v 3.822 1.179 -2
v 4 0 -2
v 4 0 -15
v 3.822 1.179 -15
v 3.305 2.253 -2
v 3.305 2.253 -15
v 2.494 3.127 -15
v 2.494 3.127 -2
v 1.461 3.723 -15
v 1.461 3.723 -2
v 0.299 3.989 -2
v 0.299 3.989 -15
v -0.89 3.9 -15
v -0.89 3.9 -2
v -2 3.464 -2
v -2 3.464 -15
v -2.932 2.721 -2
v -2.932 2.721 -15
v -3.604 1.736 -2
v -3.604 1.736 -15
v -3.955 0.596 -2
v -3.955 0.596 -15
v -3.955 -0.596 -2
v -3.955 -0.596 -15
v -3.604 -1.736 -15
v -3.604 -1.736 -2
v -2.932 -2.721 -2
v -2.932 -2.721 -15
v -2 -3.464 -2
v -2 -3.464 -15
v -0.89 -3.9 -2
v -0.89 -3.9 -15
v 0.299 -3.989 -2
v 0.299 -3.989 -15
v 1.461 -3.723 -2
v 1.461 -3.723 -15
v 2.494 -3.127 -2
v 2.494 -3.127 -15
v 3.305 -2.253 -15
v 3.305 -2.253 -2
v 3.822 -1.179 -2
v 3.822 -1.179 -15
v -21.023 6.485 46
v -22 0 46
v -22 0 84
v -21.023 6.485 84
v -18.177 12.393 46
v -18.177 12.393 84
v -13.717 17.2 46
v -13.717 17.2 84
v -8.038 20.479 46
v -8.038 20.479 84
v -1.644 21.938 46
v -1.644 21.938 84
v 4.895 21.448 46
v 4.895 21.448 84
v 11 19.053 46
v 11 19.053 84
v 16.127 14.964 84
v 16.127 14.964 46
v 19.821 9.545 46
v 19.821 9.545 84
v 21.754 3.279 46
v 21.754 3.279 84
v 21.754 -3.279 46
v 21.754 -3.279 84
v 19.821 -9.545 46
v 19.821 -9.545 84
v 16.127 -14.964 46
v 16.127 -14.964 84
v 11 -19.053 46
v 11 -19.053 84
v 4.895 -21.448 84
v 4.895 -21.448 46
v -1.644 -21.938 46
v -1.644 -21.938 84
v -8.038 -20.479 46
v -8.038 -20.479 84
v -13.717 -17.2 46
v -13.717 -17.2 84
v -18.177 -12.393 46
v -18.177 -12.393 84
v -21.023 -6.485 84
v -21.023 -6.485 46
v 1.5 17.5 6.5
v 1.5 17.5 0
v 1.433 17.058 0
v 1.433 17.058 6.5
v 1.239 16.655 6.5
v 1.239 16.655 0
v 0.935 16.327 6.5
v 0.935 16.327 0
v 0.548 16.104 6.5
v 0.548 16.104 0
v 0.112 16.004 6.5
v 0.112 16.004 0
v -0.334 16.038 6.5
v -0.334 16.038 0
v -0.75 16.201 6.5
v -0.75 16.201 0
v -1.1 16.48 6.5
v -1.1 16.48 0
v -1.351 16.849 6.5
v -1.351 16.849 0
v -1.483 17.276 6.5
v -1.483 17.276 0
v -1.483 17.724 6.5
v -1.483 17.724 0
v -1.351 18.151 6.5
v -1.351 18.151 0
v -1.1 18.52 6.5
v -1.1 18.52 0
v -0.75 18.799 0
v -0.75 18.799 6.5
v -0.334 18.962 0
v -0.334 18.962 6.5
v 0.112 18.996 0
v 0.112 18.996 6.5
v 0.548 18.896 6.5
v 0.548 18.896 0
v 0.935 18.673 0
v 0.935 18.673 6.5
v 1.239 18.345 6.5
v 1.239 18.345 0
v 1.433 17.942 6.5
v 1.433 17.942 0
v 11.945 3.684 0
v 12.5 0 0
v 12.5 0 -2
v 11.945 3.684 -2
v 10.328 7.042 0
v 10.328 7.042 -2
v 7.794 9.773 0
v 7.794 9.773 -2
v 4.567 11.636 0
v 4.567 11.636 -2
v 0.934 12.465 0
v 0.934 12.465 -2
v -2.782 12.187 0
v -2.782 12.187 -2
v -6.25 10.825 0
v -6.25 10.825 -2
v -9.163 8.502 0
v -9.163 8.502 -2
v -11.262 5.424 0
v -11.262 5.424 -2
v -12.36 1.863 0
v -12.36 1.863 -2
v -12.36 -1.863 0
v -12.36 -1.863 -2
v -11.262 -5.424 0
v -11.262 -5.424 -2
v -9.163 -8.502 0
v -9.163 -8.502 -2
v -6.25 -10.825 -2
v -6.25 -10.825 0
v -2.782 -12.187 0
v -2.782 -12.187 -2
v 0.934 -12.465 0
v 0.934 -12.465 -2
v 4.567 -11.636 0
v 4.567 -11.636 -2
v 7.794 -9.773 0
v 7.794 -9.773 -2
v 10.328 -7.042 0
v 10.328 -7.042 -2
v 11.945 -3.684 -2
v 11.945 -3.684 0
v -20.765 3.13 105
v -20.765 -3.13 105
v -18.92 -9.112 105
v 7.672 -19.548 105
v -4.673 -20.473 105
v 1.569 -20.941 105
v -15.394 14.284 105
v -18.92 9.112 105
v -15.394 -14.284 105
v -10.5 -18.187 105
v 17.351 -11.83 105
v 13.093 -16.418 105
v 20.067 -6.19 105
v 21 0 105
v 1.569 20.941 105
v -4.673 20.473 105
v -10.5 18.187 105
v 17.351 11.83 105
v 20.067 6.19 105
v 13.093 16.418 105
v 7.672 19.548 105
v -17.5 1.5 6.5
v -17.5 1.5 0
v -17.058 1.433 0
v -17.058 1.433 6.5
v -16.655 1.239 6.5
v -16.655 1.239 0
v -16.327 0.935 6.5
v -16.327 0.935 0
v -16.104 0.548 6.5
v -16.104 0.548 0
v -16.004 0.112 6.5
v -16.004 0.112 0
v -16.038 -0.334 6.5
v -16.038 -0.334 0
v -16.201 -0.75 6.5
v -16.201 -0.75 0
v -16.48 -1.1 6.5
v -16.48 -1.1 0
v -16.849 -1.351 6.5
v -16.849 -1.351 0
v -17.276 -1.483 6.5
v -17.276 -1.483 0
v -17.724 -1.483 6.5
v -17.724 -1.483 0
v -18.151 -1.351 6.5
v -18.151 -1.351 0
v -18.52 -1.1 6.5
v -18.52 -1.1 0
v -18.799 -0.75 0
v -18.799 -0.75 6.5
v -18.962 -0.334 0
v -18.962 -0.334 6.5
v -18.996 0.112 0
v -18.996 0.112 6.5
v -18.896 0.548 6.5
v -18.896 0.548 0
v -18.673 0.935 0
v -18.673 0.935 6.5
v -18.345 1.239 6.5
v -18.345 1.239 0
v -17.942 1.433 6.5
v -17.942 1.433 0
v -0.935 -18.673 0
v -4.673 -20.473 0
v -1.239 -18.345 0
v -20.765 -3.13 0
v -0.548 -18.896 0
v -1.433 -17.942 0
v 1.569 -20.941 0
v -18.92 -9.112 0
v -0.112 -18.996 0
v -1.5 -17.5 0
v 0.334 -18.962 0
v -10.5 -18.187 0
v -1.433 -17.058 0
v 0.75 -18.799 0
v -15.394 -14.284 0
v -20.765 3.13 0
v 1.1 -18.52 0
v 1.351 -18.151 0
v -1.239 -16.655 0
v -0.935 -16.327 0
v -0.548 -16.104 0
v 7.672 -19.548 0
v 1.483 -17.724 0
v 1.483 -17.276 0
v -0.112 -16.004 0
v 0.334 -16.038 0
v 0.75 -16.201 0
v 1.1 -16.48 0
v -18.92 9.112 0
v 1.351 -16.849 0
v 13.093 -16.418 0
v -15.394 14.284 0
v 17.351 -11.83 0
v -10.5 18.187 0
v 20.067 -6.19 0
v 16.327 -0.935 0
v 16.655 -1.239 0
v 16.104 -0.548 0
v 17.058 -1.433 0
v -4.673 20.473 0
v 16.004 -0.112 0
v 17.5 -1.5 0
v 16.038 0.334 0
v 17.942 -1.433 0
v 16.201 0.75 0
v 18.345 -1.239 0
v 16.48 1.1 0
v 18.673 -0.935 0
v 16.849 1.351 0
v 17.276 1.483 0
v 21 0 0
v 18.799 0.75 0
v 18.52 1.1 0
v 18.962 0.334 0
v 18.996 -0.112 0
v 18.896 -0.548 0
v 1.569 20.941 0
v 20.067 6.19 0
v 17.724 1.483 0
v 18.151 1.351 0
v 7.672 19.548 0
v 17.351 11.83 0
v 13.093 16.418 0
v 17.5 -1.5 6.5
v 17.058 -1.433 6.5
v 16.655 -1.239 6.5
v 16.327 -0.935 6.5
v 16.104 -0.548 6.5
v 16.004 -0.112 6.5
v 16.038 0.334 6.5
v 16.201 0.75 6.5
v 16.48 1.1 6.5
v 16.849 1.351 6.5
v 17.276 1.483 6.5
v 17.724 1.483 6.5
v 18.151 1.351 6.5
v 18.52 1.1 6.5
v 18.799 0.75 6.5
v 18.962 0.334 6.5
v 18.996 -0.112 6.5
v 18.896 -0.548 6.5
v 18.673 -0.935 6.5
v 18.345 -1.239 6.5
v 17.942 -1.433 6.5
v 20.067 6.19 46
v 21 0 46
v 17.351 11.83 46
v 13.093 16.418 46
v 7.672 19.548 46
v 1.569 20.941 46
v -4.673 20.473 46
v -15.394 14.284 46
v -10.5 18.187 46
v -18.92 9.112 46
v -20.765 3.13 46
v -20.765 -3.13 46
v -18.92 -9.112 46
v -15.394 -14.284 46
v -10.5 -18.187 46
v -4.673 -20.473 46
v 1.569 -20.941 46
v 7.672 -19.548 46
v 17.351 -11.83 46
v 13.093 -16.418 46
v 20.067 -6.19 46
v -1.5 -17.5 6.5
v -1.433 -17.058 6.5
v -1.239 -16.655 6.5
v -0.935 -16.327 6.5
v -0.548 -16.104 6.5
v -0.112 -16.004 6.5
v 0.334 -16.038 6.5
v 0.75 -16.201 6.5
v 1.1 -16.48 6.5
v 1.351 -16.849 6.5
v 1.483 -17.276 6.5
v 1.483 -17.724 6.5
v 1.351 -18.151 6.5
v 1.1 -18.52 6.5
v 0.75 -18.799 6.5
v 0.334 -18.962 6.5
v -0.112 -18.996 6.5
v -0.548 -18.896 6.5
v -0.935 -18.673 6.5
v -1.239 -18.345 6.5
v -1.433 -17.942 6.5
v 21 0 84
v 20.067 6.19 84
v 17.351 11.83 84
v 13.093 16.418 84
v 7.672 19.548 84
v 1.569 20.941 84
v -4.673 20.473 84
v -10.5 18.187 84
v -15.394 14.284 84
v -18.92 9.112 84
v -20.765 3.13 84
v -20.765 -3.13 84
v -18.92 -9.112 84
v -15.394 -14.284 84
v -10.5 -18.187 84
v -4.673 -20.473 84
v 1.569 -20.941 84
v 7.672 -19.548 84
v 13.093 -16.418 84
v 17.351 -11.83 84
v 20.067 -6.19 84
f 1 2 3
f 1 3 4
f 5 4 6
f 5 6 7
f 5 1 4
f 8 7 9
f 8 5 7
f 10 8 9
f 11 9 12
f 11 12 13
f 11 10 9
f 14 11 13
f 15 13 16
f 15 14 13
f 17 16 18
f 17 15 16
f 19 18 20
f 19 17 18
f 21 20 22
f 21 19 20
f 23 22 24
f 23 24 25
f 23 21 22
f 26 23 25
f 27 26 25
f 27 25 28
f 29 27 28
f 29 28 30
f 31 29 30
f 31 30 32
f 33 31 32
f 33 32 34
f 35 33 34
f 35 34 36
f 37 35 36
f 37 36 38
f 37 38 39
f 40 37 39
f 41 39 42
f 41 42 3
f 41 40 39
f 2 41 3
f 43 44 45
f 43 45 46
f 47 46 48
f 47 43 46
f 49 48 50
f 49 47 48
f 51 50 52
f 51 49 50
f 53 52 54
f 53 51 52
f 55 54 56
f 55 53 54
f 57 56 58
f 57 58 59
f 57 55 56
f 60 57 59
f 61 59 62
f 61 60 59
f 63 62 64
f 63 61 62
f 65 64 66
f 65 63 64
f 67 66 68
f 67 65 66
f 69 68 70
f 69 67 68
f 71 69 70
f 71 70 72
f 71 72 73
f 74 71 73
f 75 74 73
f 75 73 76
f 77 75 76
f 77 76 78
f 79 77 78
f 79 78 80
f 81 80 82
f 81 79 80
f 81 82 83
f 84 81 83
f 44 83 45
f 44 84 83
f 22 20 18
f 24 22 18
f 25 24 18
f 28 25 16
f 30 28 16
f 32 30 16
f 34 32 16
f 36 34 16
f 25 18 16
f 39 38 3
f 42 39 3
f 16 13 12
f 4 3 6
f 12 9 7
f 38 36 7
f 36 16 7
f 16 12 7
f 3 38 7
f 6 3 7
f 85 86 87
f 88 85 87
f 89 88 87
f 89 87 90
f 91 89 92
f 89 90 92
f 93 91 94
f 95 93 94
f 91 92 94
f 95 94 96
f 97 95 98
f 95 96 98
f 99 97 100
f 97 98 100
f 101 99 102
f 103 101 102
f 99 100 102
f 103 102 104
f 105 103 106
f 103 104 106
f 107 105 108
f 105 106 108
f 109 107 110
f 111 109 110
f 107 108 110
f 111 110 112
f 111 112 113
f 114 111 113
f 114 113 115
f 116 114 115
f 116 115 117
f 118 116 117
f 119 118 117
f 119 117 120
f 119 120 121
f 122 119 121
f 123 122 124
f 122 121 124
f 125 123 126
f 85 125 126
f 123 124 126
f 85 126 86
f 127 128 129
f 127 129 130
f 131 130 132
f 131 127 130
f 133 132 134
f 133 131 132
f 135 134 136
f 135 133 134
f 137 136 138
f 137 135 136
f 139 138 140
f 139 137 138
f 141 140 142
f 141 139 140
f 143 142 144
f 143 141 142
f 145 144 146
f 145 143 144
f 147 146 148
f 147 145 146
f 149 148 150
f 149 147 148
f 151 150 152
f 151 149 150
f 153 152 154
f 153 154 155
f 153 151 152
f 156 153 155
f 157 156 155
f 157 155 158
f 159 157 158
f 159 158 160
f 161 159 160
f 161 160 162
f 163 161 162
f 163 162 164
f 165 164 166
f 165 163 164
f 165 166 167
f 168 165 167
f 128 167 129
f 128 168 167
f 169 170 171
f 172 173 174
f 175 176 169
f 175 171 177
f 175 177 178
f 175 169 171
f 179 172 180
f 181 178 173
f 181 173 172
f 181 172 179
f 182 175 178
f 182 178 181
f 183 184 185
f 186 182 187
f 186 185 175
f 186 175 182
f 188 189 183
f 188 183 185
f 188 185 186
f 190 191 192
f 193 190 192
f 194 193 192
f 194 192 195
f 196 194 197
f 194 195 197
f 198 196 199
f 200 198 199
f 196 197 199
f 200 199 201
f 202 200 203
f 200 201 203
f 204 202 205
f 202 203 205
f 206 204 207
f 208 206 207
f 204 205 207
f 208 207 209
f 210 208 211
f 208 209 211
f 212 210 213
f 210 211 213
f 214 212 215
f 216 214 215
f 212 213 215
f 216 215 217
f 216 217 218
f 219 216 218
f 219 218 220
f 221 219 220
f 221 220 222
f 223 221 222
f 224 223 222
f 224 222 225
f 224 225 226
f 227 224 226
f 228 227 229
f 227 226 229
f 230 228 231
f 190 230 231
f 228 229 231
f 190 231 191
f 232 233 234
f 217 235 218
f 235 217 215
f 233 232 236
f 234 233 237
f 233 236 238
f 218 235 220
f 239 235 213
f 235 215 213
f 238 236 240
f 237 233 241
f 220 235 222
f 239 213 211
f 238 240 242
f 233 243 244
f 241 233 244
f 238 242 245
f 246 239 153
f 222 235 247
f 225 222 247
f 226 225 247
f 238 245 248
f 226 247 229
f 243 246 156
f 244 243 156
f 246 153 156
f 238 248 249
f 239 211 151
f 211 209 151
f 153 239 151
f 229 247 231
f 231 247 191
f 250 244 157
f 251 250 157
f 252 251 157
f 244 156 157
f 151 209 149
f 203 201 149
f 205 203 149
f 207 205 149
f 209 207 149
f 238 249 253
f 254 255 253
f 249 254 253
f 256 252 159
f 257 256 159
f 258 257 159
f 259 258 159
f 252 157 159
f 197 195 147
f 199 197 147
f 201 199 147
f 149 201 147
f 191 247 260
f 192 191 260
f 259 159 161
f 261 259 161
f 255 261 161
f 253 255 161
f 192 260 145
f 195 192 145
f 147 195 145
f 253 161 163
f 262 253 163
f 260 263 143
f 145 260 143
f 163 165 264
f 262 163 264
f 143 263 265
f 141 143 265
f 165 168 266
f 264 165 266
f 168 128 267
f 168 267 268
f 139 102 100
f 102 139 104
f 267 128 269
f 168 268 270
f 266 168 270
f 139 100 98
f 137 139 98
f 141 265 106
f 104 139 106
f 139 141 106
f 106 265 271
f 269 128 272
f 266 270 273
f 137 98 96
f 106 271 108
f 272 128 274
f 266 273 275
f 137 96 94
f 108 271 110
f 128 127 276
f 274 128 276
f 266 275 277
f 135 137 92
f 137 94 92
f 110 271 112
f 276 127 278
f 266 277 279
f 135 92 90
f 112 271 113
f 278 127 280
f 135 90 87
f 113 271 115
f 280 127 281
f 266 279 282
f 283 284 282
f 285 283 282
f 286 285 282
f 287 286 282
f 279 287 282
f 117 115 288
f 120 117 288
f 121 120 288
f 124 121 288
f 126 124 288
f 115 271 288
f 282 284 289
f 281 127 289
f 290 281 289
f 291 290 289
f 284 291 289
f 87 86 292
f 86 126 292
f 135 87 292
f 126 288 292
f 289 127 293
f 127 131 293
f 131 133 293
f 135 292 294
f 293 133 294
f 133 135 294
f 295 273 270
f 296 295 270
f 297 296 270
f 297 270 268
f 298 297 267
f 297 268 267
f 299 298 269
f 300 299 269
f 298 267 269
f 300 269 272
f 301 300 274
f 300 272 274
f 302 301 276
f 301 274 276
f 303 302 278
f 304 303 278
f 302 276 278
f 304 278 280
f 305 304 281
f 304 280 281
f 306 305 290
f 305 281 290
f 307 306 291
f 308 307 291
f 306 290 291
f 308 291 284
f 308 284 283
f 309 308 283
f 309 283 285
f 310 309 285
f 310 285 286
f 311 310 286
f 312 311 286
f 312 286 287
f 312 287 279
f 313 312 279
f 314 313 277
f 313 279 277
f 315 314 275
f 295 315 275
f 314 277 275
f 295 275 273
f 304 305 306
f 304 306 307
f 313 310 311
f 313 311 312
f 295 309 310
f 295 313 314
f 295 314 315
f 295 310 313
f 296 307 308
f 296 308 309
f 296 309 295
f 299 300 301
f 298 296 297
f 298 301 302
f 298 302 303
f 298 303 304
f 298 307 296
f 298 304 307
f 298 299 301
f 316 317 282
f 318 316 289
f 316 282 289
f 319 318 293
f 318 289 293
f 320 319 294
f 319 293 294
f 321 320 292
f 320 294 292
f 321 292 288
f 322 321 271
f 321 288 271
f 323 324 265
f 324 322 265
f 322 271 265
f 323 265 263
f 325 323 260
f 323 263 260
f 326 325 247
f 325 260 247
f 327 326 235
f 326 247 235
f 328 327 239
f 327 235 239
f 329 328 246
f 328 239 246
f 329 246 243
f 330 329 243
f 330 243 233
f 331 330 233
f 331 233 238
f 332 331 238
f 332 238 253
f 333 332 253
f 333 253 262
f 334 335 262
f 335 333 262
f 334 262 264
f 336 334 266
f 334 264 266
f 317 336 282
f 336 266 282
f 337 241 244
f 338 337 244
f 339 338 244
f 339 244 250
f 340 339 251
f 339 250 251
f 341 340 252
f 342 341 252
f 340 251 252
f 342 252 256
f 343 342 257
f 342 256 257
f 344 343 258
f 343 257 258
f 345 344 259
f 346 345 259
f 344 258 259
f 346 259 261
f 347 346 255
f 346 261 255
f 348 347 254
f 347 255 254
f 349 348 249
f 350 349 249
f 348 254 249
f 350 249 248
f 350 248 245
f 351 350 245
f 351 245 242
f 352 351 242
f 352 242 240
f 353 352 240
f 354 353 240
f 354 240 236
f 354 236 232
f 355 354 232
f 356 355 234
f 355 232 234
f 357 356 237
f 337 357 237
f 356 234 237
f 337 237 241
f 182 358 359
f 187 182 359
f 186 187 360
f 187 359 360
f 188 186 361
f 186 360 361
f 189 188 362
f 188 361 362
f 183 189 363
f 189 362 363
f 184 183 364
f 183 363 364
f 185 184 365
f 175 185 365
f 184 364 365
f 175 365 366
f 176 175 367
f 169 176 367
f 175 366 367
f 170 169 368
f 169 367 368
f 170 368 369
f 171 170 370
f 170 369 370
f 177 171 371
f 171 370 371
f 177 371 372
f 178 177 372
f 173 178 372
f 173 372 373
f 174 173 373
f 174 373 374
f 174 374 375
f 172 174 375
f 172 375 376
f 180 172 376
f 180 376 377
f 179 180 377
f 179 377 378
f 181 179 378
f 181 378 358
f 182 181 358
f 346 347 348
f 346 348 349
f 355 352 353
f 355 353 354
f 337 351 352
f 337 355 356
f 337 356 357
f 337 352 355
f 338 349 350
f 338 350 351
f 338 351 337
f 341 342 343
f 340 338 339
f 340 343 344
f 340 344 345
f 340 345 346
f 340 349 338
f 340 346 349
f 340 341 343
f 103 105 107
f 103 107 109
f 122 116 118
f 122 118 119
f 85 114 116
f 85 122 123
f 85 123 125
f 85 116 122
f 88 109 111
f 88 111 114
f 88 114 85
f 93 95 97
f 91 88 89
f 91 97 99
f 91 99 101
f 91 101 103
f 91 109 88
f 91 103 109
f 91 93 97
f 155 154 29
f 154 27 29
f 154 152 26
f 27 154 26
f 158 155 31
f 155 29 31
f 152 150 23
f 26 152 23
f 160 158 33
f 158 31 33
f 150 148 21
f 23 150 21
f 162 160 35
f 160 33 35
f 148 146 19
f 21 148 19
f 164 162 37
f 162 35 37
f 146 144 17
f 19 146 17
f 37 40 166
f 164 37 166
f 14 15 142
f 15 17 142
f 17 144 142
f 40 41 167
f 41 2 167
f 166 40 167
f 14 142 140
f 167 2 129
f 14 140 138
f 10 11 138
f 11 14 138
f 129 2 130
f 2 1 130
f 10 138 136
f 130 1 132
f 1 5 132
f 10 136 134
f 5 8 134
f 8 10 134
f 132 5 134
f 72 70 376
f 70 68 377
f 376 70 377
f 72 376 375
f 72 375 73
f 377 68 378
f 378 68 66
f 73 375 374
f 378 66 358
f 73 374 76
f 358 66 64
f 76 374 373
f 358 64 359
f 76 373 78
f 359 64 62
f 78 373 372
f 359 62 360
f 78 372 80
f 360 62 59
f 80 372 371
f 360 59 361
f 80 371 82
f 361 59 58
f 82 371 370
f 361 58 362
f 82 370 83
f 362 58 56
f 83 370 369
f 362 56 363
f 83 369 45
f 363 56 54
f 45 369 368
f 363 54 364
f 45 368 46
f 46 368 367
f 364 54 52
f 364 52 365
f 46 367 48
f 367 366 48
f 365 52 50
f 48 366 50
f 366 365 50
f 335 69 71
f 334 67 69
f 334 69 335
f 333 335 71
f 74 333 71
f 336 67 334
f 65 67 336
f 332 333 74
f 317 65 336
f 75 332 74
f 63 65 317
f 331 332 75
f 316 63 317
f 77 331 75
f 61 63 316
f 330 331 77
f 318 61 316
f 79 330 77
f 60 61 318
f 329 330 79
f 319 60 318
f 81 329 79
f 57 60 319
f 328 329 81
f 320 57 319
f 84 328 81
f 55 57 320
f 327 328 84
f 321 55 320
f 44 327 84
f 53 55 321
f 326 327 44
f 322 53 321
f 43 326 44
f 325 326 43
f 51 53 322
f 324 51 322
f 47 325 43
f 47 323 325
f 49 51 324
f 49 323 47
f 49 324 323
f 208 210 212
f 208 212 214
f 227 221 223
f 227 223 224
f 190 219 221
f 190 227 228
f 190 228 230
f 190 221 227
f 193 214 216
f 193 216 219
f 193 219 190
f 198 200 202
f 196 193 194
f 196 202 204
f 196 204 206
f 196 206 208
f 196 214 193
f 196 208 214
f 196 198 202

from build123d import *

# Parameters (mm, degrees)
SKETCH_1_R               = 21
SKETCH_1_R_2             = 4
SKETCH_1_R_3             = 12.5
EXTRUDE_1_DEPTH          = 105
EXTRUDE_START            = -46
SKETCH_3_R               = 22
EXTRUDE_3_DEPTH          = 38
SKETCH_1_4_R             = 12.5
SKETCH_1_4_R_2           = 4
EXTRUDE_4_DEPTH          = 2
EXTRUDE_START_2          = -2
SKETCH_1_5_R             = 4
EXTRUDE_5_DEPTH          = 13
SKETCH_4_R               = 1.5
CUT_EXTRUDE_1_DEPTH      = 6.5
PATTERN_CIRCULAR_1_COUNT = 4


with BuildPart() as part:
    # 스케치1 → 보스-돌출1 (new body)
    # profile 1 of 3: a face of its own
    with BuildSketch(Plane.XY):
        Circle(SKETCH_1_R)
        Circle(SKETCH_1_R_2, mode=Mode.SUBTRACT)
    # profile 2 of 3: a face of its own
    with BuildSketch(Plane.XY):
        Circle(SKETCH_1_R_3)
        Circle(SKETCH_1_R_2, mode=Mode.SUBTRACT)
    # profile 3 of 3: a face of its own
    with BuildSketch(Plane.XY):
        Circle(SKETCH_1_R_2)
    extrude(amount=EXTRUDE_1_DEPTH)

    # 스케치3 → 보스-돌출3 (add)
    with BuildSketch(Plane(origin=(0, 0, 0), x_dir=(-1, 0, 0), z_dir=(0, 0, -1)).offset(EXTRUDE_START)):
        Circle(SKETCH_3_R)
    extrude(amount=-EXTRUDE_3_DEPTH)

    # 스케치1<4> → 보스-돌출4 (add)
    # profile 1 of 2: a face of its own
    with BuildSketch(Plane.XY):
        Circle(SKETCH_1_4_R)
        Circle(SKETCH_1_4_R_2, mode=Mode.SUBTRACT)
    # profile 2 of 2: a face of its own
    with BuildSketch(Plane.XY):
        Circle(SKETCH_1_4_R_2)
    extrude(amount=-EXTRUDE_4_DEPTH)

    # 스케치1<5> → 보스-돌출5 (add)
    with BuildSketch(Plane.XY.offset(EXTRUDE_START_2)):
        Circle(SKETCH_1_5_R)
    extrude(amount=-EXTRUDE_5_DEPTH)

    # 스케치4 → 컷-돌출1 (cut)
    with BuildSketch(Plane(origin=(0, 0, 0), x_dir=(-1, 0, 0), z_dir=(0, 0, -1))):
        with Locations((0, -17.5)):
            Circle(SKETCH_4_R)
    cut_extrude_1 = extrude(amount=-CUT_EXTRUDE_1_DEPTH, mode=Mode.SUBTRACT)

    # 원형 패턴1: 컷-돌출1 ×4 about axis
    pattern_circular_1_axis = Axis((0, 0, 0), (0, 0, 1))
    for i in range(1, PATTERN_CIRCULAR_1_COUNT):
        add(cut_extrude_1.rotate(pattern_circular_1_axis, i * 360 / PATTERN_CIRCULAR_1_COUNT), mode=Mode.SUBTRACT)


solid = part.part
